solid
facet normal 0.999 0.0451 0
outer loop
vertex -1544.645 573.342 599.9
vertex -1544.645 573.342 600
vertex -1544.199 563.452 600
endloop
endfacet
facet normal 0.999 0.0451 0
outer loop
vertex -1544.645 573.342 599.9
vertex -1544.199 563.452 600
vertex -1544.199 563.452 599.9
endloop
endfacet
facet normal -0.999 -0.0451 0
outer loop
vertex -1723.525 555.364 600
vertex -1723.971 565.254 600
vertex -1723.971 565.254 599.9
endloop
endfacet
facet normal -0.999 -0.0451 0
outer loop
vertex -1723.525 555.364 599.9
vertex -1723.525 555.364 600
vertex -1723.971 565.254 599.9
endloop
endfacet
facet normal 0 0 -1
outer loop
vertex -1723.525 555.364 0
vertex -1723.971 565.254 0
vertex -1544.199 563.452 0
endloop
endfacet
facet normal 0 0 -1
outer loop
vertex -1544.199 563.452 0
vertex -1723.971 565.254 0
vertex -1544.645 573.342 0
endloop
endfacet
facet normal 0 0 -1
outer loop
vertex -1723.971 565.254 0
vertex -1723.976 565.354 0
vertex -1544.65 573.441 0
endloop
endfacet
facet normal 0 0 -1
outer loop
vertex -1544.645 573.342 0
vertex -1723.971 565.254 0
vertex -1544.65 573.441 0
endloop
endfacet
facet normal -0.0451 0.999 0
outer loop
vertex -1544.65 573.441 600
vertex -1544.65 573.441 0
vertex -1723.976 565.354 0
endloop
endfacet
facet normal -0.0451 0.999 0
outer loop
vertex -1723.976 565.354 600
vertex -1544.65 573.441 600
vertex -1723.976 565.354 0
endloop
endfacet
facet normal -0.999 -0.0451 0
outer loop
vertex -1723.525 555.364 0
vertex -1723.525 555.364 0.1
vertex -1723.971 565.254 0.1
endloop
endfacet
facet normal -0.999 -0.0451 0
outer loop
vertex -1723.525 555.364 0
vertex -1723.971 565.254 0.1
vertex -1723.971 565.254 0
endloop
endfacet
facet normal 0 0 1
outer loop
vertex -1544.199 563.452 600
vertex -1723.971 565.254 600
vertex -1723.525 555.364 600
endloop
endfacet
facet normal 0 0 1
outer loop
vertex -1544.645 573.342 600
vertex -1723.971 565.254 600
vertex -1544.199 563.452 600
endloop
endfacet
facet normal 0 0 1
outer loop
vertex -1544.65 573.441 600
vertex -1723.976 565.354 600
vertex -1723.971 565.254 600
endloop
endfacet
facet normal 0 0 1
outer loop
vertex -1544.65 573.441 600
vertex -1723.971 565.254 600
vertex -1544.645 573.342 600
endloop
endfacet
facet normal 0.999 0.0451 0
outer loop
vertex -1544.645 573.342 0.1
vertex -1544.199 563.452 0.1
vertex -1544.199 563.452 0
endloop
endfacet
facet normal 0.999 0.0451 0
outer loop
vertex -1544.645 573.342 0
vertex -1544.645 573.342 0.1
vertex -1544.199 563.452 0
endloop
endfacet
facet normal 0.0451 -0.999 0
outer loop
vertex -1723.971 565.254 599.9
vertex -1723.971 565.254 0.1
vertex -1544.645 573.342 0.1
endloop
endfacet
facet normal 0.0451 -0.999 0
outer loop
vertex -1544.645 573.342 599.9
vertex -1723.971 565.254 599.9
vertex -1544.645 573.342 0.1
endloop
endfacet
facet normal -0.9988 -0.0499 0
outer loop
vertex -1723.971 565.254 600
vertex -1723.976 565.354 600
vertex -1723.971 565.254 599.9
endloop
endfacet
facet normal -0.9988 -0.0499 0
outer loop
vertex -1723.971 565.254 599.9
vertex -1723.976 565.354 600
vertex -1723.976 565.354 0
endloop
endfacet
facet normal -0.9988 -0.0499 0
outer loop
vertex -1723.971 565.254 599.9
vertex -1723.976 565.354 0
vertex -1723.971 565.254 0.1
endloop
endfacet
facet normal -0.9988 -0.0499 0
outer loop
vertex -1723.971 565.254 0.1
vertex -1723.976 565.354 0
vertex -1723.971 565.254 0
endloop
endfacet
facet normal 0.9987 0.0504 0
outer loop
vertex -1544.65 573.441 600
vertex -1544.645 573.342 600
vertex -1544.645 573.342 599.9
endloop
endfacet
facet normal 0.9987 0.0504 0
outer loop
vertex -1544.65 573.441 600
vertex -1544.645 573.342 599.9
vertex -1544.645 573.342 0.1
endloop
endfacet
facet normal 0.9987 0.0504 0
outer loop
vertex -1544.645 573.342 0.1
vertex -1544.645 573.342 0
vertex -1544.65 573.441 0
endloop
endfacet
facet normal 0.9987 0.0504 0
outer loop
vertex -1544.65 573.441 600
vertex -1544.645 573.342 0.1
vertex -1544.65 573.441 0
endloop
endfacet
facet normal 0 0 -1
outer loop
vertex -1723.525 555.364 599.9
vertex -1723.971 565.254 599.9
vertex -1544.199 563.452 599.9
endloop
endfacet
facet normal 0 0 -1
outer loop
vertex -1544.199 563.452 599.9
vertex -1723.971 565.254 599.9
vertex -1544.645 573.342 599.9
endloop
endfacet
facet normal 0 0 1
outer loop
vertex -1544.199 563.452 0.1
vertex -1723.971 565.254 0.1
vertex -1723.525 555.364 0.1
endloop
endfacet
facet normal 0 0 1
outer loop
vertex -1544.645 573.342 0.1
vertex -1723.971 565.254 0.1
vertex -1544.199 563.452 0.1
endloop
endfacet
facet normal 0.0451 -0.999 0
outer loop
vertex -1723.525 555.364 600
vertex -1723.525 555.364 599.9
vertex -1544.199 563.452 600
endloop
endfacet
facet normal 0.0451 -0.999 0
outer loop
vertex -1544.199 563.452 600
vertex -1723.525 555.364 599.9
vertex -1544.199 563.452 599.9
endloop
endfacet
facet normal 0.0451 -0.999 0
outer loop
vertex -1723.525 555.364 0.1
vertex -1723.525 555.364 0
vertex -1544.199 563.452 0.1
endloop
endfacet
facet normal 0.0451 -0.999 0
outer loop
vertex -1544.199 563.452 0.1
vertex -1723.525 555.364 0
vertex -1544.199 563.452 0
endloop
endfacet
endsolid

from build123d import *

# Parameters (mm, degrees)
BOSS_EXTRUDE2_DEPTH = 600
SKETCH2_W           = 179.507885947
SKETCH2_H           = 0.1
BOSS_EXTRUDE3_DEPTH = 10
SKETCH3_W           = 179.507885947
SKETCH3_H           = 0.1
BOSS_EXTRUDE4_DEPTH = 10


with BuildPart() as part:
    # Sketch1 → Boss-Extrude2 (new body)
    with BuildSketch(Plane.XY):
        Polygon((-1723.971070815, 565.254300802), (-1544.645451435, 573.341534617), (-1544.649956659, 573.44143308), (-1723.97557604, 565.354199265), align=None)
    extrude(amount=BOSS_EXTRUDE2_DEPTH)

    # Sketch2 → Boss-Extrude3 (add)
    with BuildSketch(Plane(origin=(-28.943777696, 641.796809779, 0), x_dir=(0.998984632, 0.045052248, 0), z_dir=(-0.045052248, 0.998984632, 0))):
        with Locations((-1607.000685751, -0.05)):
            Rectangle(SKETCH2_W, SKETCH2_H)
    extrude(amount=-BOSS_EXTRUDE3_DEPTH)

    # Sketch3 → Boss-Extrude4 (add)
    with BuildSketch(Plane(origin=(-28.943777696, 641.796809779, 0), x_dir=(0.998984632, 0.045052248, 0), z_dir=(-0.045052248, 0.998984632, 0))):
        with Locations((-1607.000685751, -599.95)):
            Rectangle(SKETCH3_W, SKETCH3_H)
    extrude(amount=-BOSS_EXTRUDE4_DEPTH)


solid = part.part
